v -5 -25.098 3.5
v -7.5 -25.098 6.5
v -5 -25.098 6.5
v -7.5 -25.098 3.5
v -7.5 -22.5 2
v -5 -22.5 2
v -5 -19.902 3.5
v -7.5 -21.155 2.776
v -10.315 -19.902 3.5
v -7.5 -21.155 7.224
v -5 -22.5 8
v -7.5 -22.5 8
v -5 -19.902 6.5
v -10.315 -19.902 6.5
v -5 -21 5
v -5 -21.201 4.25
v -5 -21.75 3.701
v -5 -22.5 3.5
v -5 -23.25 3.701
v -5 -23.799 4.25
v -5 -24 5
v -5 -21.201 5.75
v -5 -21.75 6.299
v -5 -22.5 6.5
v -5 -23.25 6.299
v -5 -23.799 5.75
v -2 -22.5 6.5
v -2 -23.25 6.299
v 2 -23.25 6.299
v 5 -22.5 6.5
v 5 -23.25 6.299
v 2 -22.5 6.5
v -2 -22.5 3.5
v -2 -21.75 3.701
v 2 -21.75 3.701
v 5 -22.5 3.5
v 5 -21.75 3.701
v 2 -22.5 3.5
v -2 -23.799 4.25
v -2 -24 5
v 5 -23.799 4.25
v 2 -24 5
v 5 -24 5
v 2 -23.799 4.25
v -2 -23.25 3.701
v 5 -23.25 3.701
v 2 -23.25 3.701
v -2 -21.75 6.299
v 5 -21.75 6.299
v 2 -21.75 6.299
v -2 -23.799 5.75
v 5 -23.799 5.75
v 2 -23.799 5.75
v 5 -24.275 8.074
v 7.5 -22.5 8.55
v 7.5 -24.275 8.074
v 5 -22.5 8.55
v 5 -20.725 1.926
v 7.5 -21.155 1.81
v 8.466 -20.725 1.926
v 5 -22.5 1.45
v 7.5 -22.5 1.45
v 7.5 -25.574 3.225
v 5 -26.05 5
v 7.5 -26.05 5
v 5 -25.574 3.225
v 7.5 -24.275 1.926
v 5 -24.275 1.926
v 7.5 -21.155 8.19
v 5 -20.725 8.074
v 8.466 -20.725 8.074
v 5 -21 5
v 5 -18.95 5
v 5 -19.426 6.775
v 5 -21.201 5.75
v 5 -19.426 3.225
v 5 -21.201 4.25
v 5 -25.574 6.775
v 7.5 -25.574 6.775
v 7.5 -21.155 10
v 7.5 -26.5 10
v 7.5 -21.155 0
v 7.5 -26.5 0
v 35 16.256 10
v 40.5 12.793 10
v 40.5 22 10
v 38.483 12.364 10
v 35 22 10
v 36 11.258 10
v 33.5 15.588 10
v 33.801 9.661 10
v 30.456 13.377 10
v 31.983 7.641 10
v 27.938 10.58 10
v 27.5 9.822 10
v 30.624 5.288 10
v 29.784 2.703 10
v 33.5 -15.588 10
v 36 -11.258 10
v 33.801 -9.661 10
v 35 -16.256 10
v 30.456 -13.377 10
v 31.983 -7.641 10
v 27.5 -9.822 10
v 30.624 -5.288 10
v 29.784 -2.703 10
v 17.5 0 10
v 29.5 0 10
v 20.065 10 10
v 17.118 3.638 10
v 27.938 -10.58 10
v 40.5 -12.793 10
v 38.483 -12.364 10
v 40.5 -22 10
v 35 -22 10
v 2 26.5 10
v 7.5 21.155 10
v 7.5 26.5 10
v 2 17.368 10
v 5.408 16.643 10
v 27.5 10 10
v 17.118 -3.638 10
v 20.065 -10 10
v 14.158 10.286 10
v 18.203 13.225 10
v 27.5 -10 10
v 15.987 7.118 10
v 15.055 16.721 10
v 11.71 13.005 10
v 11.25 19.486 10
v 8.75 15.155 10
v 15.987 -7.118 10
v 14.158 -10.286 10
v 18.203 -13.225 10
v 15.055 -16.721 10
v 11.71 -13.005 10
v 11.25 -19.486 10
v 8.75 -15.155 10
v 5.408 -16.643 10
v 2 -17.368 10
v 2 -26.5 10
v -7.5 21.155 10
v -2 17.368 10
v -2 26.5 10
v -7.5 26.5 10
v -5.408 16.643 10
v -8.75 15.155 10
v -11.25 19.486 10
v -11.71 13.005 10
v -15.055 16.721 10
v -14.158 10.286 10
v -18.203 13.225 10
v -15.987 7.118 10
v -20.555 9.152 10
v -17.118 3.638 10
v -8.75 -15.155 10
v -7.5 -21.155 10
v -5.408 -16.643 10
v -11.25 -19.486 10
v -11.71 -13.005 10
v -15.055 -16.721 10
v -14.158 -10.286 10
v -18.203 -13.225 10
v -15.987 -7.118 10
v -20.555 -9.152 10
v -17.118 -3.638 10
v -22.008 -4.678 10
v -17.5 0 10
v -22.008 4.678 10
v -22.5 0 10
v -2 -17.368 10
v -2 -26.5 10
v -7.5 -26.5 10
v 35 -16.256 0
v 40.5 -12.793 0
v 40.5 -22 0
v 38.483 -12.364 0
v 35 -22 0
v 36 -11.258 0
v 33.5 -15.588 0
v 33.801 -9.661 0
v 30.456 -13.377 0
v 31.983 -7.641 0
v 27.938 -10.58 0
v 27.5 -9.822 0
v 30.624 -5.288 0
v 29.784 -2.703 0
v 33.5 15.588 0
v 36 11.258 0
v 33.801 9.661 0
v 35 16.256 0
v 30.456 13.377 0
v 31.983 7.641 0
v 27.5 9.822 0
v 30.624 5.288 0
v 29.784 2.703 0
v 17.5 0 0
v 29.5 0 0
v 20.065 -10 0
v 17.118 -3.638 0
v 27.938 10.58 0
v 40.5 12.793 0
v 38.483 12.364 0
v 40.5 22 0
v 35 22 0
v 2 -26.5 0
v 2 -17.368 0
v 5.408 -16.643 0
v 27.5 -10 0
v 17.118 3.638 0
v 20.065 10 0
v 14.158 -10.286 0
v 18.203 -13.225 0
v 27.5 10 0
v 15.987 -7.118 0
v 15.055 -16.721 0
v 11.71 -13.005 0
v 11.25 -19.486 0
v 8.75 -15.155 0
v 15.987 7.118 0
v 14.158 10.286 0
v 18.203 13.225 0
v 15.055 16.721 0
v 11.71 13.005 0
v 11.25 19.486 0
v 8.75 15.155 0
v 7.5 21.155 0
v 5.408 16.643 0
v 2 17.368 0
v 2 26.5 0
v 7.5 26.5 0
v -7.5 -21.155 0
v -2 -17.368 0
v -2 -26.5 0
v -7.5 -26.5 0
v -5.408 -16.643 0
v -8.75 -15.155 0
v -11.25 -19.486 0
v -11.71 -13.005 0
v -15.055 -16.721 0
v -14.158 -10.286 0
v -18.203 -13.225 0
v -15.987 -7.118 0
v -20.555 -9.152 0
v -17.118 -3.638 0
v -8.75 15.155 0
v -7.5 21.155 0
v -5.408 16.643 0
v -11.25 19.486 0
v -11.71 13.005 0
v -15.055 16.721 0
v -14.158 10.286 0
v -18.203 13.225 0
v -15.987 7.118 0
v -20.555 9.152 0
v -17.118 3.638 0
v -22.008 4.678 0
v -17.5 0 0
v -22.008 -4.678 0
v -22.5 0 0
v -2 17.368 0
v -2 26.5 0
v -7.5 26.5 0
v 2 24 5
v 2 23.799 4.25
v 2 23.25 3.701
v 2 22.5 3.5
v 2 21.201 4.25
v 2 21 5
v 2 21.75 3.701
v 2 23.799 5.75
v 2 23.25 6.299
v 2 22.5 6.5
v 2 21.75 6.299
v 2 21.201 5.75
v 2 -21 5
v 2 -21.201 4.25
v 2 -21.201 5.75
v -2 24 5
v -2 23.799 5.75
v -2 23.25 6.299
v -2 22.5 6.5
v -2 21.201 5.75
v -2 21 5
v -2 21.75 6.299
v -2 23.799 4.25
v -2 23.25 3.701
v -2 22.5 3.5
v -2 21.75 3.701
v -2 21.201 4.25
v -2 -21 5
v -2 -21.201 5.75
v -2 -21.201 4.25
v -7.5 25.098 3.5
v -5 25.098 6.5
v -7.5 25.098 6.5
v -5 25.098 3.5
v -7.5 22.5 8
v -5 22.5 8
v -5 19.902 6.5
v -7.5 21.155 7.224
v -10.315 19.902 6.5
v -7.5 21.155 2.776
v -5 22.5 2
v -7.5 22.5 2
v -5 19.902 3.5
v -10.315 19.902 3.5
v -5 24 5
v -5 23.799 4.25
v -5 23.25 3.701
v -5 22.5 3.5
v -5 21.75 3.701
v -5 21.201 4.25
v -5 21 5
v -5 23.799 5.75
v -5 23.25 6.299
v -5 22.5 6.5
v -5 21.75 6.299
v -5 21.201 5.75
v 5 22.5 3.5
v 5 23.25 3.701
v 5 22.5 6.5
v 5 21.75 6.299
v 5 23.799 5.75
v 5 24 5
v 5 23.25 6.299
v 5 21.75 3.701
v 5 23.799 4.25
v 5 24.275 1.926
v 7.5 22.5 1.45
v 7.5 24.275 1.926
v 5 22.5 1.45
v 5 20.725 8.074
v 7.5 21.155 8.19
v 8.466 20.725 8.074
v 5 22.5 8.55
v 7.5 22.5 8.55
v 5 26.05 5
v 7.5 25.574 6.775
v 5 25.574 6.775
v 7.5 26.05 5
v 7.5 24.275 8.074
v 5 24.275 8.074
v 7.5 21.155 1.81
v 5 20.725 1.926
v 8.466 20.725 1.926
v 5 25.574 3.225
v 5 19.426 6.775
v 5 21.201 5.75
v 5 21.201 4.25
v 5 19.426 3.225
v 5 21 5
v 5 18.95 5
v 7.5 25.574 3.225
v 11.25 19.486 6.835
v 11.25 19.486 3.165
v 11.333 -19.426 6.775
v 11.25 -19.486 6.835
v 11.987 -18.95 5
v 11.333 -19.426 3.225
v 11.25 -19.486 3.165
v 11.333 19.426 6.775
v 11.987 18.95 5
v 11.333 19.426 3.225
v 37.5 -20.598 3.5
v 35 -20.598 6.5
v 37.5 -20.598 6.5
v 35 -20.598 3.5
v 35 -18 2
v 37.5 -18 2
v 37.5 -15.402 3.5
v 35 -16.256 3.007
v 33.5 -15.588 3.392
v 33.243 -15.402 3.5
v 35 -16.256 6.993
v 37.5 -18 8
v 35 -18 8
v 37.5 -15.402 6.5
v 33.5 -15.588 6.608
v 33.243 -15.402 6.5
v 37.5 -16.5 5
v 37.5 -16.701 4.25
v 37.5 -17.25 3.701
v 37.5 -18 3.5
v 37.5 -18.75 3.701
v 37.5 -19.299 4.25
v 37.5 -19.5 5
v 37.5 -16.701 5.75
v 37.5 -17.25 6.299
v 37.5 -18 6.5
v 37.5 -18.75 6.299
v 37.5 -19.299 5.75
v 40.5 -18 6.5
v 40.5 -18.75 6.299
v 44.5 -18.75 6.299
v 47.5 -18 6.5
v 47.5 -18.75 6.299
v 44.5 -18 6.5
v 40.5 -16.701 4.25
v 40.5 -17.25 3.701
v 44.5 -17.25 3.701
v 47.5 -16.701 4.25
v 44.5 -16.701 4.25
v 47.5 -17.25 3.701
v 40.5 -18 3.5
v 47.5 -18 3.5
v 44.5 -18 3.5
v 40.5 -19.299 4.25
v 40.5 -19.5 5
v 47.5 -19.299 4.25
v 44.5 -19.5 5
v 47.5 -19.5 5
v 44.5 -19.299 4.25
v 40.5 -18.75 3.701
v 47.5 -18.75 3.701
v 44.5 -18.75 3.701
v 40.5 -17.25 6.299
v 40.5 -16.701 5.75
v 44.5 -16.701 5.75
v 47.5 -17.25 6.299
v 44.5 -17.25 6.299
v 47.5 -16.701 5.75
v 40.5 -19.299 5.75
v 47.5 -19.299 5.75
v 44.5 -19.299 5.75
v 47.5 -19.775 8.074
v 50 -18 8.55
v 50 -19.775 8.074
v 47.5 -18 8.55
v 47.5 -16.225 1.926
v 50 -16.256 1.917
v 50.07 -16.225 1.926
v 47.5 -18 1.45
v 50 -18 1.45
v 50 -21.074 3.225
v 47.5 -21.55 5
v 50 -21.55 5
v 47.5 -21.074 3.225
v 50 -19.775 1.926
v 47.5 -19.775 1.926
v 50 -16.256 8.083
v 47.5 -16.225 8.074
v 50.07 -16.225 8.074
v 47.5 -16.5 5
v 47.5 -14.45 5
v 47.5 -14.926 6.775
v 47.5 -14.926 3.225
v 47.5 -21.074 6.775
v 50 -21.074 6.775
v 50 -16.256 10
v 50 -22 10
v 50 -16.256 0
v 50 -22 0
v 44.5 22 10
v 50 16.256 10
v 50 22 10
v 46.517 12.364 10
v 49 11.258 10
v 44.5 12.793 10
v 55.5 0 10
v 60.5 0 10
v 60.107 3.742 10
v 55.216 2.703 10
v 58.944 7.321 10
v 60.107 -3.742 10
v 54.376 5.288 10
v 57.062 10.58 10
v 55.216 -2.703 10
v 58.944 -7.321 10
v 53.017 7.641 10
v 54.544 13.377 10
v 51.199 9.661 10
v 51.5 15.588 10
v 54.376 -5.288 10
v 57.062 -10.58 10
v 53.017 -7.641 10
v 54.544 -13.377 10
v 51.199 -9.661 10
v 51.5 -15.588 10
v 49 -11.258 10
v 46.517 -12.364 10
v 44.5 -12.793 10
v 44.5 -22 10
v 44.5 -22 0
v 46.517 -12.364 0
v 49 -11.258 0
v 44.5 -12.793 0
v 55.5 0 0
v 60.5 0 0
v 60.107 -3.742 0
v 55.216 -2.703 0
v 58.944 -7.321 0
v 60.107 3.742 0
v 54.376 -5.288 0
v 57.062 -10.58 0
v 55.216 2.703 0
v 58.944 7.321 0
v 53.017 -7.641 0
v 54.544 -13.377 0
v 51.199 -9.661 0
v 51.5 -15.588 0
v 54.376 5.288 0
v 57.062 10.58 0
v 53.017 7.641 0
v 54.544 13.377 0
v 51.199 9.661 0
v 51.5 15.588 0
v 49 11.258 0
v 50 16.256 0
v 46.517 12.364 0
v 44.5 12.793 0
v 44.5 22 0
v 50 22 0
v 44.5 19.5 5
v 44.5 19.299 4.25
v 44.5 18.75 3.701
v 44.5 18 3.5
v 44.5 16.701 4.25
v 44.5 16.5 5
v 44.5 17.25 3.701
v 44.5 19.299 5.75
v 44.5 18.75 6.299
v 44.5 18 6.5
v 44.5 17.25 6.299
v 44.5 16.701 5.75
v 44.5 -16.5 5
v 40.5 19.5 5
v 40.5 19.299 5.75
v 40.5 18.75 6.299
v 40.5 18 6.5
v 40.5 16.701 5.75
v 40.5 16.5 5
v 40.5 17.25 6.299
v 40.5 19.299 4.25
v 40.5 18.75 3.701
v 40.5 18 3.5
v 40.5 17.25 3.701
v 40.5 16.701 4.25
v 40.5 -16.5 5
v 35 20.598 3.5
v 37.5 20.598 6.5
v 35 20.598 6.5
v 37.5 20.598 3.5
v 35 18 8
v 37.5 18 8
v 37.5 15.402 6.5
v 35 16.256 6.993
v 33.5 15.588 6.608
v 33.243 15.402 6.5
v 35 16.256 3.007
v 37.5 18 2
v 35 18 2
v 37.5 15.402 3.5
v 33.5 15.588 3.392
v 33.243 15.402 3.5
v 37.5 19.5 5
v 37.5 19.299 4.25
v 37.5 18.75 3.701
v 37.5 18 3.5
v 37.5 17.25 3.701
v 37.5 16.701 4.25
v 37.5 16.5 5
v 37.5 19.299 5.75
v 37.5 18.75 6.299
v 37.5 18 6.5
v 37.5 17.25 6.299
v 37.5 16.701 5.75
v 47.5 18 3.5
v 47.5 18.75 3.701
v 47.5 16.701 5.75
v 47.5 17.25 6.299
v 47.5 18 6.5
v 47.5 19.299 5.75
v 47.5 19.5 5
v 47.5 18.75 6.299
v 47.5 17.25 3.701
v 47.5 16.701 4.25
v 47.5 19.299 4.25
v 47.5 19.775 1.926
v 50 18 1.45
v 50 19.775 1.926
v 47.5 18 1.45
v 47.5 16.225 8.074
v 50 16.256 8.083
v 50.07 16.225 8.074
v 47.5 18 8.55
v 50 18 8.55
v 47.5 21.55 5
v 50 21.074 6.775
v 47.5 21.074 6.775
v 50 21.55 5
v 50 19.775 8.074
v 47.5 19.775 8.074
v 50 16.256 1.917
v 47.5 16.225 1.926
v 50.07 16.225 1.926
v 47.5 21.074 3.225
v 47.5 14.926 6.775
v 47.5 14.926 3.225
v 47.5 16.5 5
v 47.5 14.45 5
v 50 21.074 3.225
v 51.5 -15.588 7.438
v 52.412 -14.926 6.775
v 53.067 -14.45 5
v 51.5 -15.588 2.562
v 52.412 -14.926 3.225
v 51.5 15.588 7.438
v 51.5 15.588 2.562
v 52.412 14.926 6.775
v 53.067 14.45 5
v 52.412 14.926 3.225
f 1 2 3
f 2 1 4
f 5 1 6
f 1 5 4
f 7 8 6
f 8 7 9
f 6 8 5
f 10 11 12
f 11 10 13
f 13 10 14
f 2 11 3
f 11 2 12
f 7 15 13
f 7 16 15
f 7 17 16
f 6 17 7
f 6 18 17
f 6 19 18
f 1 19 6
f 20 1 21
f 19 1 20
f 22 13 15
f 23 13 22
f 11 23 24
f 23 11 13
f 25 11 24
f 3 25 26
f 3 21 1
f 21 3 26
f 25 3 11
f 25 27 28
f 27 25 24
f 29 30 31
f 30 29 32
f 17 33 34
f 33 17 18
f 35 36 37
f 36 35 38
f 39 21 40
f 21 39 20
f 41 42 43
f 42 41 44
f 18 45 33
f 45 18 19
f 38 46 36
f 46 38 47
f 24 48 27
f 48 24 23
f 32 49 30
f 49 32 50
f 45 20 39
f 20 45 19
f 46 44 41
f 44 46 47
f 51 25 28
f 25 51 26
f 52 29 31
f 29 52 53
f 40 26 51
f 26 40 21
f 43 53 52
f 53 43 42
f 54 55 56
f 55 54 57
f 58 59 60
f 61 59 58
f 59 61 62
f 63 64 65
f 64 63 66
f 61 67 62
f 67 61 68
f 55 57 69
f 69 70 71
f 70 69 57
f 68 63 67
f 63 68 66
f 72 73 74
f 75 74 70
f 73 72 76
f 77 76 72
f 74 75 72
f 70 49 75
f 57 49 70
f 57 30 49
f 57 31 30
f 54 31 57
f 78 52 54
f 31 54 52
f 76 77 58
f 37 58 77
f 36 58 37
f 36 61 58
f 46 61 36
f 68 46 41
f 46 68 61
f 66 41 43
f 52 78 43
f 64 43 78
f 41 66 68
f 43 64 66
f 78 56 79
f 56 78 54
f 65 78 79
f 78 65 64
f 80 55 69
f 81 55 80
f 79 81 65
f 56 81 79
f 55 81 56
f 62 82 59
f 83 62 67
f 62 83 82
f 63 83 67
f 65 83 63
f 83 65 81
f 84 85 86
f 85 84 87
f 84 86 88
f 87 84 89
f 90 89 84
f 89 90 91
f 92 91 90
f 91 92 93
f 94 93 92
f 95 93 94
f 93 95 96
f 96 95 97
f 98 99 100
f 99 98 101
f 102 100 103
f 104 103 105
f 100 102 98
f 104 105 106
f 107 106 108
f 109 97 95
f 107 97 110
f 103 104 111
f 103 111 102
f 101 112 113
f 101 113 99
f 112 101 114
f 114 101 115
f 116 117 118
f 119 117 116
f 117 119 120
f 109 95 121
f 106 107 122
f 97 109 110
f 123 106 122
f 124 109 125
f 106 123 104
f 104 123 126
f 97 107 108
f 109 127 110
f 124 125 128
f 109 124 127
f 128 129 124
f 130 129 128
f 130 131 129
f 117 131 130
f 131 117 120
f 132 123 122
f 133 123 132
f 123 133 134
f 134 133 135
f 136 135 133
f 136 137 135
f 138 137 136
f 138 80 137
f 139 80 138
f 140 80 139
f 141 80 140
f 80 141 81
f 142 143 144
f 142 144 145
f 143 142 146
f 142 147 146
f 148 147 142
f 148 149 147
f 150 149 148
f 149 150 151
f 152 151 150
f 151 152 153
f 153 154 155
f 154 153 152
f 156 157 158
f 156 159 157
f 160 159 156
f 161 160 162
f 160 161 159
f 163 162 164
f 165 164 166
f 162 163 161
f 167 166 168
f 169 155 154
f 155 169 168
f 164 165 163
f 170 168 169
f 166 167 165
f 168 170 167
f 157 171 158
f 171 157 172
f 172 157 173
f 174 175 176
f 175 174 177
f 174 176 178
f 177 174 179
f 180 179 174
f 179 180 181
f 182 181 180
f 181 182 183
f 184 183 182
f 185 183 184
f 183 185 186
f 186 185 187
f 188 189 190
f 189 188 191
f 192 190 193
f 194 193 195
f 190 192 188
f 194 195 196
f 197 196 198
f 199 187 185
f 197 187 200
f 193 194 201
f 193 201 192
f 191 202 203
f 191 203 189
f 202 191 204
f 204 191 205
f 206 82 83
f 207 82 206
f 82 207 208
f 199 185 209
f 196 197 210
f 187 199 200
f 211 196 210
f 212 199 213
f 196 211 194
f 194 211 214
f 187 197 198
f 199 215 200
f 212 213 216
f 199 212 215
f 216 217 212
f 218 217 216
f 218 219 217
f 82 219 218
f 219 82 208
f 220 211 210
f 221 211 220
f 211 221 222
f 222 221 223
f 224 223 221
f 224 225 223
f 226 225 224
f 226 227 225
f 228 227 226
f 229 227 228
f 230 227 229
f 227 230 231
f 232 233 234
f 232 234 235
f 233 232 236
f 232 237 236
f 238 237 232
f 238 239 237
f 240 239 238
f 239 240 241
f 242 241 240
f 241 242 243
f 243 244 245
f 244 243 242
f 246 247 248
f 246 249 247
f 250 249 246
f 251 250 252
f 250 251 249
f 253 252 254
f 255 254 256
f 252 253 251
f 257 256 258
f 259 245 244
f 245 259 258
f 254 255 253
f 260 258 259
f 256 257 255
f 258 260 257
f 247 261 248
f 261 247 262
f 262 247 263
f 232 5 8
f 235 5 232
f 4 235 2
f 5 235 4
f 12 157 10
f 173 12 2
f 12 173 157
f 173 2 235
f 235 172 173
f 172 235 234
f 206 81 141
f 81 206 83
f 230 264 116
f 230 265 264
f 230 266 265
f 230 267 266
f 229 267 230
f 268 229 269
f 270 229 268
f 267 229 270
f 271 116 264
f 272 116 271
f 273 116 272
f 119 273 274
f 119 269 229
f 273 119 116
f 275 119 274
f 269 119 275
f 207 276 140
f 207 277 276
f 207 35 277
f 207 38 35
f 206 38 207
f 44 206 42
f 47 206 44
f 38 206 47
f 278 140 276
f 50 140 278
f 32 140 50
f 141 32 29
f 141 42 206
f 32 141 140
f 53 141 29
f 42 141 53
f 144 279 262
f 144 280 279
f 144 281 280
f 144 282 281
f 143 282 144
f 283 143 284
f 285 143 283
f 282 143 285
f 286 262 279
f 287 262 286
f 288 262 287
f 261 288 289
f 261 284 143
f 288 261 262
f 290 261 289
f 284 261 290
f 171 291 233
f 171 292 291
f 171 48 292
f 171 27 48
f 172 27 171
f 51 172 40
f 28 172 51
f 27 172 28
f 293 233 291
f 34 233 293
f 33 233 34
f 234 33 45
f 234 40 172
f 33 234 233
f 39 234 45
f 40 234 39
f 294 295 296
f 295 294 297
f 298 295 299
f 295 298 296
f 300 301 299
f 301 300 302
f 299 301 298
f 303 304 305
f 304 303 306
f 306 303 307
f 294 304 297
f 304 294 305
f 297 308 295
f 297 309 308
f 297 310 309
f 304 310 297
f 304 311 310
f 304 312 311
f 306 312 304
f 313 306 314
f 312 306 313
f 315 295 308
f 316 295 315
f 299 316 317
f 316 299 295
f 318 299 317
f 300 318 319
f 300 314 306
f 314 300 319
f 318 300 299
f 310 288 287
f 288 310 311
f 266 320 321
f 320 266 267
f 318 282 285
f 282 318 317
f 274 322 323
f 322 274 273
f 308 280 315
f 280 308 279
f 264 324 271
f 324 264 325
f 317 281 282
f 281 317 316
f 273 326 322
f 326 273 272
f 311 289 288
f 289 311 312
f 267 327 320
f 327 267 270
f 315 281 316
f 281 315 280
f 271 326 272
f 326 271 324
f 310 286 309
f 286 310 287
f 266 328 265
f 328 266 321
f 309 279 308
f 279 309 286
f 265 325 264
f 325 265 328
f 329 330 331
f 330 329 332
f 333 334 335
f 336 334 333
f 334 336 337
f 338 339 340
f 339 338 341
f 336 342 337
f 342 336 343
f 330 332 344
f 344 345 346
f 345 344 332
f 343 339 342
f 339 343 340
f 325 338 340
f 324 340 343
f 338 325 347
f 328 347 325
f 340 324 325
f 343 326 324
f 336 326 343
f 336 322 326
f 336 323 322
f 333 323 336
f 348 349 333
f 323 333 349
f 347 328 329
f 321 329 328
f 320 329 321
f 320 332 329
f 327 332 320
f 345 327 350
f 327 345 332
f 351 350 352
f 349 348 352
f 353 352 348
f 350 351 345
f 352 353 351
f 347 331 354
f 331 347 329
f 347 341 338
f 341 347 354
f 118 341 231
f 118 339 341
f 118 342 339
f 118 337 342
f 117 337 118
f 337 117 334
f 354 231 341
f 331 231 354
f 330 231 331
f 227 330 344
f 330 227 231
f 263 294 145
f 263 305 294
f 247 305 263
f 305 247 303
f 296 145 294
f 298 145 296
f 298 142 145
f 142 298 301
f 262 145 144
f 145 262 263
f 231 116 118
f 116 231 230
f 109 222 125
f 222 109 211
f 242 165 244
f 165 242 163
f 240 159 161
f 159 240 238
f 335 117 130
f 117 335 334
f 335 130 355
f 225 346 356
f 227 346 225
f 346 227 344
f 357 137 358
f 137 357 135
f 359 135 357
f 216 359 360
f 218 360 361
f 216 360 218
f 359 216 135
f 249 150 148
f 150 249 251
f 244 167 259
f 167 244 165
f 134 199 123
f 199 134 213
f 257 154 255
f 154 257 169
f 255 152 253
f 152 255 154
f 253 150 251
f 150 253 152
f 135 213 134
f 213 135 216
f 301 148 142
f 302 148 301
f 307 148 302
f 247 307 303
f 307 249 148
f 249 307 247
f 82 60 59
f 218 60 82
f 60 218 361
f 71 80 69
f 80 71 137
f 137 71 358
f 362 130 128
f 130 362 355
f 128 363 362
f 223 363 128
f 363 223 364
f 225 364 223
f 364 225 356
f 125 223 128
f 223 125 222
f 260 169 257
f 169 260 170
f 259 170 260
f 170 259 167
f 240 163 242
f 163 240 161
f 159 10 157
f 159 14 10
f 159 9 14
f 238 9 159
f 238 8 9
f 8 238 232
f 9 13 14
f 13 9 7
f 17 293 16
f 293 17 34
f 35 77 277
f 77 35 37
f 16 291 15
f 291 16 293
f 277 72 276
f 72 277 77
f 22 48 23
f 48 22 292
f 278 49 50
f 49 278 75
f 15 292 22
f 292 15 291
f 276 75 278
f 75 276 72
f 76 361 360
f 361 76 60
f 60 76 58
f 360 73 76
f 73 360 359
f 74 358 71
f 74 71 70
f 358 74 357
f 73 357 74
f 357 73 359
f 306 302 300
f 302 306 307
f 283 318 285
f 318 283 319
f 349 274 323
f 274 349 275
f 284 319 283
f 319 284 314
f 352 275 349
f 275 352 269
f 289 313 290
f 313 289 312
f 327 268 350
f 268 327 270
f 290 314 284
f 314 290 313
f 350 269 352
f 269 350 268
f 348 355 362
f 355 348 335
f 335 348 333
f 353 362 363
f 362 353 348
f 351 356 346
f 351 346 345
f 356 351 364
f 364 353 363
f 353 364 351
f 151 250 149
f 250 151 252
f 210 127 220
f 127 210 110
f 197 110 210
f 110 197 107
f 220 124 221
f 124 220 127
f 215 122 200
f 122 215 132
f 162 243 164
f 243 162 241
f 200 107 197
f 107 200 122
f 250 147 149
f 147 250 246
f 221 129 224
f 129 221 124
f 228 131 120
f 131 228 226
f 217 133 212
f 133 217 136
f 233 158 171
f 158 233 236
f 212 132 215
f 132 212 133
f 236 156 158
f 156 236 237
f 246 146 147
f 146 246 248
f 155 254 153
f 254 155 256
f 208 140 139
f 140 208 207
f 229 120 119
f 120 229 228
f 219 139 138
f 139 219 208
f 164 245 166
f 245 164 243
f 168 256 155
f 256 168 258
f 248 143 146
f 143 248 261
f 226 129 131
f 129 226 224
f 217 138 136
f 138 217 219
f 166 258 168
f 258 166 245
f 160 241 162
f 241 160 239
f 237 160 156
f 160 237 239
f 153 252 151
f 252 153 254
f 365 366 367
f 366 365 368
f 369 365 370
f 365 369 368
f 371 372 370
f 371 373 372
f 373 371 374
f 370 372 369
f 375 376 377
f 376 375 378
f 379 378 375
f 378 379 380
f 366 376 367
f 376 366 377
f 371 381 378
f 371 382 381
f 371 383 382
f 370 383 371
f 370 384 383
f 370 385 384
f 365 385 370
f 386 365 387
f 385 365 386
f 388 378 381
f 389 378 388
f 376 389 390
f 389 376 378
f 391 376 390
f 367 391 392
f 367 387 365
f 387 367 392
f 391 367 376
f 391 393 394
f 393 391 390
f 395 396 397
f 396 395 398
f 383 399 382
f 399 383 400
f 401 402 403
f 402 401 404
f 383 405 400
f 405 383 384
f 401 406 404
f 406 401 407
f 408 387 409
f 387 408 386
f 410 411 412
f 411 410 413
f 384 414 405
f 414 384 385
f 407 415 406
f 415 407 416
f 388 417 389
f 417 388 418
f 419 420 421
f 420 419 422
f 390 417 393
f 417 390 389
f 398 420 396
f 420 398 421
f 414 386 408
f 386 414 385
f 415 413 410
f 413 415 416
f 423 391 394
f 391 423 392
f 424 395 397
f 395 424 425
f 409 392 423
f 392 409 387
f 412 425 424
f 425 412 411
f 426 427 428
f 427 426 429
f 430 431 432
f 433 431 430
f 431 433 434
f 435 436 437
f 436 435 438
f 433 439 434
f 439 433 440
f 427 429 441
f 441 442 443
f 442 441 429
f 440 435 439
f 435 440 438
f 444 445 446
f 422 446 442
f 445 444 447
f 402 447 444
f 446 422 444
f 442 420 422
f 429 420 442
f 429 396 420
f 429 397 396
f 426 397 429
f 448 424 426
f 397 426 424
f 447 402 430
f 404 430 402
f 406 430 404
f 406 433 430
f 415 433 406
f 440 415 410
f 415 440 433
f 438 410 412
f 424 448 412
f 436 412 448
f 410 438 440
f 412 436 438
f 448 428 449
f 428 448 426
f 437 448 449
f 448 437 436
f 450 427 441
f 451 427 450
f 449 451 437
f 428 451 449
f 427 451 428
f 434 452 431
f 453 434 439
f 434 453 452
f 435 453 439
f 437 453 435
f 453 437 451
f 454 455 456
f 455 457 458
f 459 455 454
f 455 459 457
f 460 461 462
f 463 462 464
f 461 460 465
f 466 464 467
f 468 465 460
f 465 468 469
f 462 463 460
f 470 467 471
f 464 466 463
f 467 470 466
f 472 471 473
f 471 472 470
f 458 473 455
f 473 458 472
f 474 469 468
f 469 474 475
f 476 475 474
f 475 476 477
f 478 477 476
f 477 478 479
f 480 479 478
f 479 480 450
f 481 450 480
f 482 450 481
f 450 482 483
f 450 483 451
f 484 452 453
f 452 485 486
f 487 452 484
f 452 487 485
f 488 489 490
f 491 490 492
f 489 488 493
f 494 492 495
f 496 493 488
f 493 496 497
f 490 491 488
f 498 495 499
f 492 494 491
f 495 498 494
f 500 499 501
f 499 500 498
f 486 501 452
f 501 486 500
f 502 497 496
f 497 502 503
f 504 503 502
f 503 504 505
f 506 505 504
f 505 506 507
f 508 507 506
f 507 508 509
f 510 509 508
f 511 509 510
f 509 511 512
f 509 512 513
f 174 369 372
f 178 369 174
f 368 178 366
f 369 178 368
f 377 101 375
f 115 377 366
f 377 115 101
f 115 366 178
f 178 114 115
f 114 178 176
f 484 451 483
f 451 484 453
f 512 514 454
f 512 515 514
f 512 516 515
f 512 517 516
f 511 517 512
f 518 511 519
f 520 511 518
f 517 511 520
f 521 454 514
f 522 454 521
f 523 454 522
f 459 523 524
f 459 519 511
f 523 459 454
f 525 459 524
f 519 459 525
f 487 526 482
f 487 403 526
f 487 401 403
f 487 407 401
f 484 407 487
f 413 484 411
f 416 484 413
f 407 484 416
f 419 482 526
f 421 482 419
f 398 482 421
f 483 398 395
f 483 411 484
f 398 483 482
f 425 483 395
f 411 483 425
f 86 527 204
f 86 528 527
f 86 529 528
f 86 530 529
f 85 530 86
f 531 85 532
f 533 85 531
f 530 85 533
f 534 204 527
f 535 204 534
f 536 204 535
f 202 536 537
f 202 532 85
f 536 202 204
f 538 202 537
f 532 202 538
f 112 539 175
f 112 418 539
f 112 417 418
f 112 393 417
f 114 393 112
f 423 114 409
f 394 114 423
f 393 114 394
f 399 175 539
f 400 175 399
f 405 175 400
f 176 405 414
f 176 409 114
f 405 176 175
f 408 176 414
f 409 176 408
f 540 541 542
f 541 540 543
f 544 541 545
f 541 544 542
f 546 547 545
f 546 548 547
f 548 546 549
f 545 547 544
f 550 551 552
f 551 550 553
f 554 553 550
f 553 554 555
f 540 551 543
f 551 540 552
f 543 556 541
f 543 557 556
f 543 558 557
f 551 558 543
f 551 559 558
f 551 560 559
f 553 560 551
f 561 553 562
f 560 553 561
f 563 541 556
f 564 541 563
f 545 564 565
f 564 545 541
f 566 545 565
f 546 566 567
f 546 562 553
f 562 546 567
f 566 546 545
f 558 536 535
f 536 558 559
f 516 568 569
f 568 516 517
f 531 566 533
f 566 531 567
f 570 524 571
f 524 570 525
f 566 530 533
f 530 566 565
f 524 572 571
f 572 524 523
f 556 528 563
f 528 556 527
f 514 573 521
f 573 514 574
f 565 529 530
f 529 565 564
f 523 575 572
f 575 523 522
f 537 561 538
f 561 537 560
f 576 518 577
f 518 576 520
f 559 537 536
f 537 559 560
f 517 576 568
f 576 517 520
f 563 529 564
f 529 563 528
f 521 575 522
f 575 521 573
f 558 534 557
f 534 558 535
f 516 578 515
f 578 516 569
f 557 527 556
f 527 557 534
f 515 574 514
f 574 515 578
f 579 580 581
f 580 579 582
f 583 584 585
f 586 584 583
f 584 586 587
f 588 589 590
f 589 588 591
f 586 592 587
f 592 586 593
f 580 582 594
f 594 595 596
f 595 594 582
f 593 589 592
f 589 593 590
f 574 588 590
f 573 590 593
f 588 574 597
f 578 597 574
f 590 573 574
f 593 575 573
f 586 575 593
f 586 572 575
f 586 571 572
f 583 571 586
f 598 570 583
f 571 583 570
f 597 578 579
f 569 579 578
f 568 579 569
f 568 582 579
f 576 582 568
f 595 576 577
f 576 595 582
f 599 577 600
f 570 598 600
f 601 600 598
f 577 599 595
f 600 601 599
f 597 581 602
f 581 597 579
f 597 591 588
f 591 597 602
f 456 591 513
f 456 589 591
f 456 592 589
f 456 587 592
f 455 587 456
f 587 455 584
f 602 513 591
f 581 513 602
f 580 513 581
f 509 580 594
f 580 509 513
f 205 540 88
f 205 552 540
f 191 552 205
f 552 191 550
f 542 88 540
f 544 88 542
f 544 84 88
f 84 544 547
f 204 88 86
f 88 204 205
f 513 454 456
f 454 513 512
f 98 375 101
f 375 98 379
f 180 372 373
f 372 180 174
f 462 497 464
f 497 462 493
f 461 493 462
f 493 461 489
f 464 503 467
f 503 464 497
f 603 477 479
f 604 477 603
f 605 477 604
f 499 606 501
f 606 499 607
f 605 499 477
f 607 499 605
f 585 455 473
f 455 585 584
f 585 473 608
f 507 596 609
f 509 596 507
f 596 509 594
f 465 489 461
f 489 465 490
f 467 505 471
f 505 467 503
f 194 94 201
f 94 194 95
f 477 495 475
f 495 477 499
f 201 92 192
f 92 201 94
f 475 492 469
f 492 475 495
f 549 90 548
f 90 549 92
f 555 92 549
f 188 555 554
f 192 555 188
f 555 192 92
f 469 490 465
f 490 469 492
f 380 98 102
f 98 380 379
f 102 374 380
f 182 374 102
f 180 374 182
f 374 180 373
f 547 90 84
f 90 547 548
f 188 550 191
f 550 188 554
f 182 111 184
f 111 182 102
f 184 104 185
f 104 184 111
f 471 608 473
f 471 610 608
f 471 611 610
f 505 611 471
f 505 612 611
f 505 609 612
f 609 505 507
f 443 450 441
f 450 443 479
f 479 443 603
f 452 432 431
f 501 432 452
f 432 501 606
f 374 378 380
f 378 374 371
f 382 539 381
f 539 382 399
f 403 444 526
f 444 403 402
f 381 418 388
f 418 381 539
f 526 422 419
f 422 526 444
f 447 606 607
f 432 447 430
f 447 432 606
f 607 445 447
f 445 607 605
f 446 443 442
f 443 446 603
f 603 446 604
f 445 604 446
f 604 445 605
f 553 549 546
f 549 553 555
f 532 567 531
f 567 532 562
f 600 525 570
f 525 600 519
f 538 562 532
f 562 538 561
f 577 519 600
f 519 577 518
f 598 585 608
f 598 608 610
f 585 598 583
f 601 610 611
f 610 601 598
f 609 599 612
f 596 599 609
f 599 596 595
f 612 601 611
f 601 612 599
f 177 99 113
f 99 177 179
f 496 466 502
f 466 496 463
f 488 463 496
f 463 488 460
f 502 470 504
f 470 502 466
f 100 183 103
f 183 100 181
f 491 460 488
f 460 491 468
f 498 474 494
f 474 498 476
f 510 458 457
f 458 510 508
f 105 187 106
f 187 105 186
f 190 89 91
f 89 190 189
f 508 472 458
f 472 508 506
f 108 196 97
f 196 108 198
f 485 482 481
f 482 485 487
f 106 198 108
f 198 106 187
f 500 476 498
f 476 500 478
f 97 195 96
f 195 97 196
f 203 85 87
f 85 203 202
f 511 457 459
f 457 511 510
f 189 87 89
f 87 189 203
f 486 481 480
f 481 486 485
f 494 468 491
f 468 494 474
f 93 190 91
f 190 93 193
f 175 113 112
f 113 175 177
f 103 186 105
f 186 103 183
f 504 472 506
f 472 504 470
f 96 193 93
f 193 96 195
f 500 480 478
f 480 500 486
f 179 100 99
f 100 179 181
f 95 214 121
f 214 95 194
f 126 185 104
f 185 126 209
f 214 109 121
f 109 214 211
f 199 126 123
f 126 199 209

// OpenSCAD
handlebar_dia = 35;
clamp_thickness = 5;
clamp_width = 10;
clamp_gap = 4;

fl_dia=26;

screew_block_ = [15, 20, clamp_width];

M3_nut_dia = 6;
M3_dia = 3;
M3_washer_dia = 7.1;
cutout_clearance=10;
nut_offset=1;

outer_dia=handlebar_dia+2*clamp_thickness;
outer_fl_dia=fl_dia+2*clamp_thickness;

block_offset=0.20;

module nut() {
  $fn = 6;
  cylinder(d=M3_nut_dia, h=10);
}

module screew_cutout() {
cutout_offset=(screew_block_[0]-cutout_clearance);
//cutout_offset=0;
translate([-10+0.5*cutout_offset, 0.5*M3_nut_dia+nut_offset, 0.5*(clamp_width)])
rotate([0, 90, 0]) {
  nut(); $fn=12;
  cylinder(d=M3_dia, h=40);
  translate([0, 0, 10+cutout_clearance])
    cylinder(d=M3_washer_dia, h=10);
}
}

module screew_block() {
  difference() {
    cube(screew_block_);
    translate([0.5*(-clamp_gap+screew_block_[0]), 0, 0]) cube([clamp_gap, screew_block_[1], screew_block_[2]]);
    screew_cutout();
  }
}

module body_cutout(outer_dia, inner_dia) {
  cylinder(d=inner_dia, h=clamp_width);
  translate([-0.5*clamp_gap, -0.5*outer_dia, 0]) cube([clamp_gap,  outer_dia, clamp_width]);
  translate([-0.5*screew_block_[0], -(block_offset*screew_block_[1]+0.5*outer_dia), 0])
      screew_cutout();
  translate([0,0,clamp_width])
  rotate([0,180,180]) translate([-0.5*screew_block_[0], -(block_offset*screew_block_[1]+0.5*outer_dia), 0])
      screew_cutout();
}


module body_outline(dia) {
  cylinder(d=dia, h=clamp_width);
  translate([-0.5*screew_block_[0], -(block_offset*screew_block_[1]+0.5*dia), 0]) screew_block();
  translate([0, 0, clamp_width]) rotate([180, 0, 0]) 
    translate([-0.5*screew_block_[0], -(block_offset*screew_block_[1]+0.5*dia), 0]) screew_block();
}

module clamp(outer_dia, inner_dia) {
  difference() {
    body_outline(outer_dia);
    body_cutout(outer_dia, inner_dia);
  }
}
//body_cutout(outer_dia, handlebar_dia);

clamp(outer_dia, handlebar_dia);
translate([0.5*(outer_dia+outer_fl_dia)+2, 0, 0]) clamp(outer_fl_dia, fl_dia);
connector_y = 20;
translate([0.5*handlebar_dia, -0.5*connector_y, 0])
  cube([2*clamp_thickness, connector_y, clamp_width]);
